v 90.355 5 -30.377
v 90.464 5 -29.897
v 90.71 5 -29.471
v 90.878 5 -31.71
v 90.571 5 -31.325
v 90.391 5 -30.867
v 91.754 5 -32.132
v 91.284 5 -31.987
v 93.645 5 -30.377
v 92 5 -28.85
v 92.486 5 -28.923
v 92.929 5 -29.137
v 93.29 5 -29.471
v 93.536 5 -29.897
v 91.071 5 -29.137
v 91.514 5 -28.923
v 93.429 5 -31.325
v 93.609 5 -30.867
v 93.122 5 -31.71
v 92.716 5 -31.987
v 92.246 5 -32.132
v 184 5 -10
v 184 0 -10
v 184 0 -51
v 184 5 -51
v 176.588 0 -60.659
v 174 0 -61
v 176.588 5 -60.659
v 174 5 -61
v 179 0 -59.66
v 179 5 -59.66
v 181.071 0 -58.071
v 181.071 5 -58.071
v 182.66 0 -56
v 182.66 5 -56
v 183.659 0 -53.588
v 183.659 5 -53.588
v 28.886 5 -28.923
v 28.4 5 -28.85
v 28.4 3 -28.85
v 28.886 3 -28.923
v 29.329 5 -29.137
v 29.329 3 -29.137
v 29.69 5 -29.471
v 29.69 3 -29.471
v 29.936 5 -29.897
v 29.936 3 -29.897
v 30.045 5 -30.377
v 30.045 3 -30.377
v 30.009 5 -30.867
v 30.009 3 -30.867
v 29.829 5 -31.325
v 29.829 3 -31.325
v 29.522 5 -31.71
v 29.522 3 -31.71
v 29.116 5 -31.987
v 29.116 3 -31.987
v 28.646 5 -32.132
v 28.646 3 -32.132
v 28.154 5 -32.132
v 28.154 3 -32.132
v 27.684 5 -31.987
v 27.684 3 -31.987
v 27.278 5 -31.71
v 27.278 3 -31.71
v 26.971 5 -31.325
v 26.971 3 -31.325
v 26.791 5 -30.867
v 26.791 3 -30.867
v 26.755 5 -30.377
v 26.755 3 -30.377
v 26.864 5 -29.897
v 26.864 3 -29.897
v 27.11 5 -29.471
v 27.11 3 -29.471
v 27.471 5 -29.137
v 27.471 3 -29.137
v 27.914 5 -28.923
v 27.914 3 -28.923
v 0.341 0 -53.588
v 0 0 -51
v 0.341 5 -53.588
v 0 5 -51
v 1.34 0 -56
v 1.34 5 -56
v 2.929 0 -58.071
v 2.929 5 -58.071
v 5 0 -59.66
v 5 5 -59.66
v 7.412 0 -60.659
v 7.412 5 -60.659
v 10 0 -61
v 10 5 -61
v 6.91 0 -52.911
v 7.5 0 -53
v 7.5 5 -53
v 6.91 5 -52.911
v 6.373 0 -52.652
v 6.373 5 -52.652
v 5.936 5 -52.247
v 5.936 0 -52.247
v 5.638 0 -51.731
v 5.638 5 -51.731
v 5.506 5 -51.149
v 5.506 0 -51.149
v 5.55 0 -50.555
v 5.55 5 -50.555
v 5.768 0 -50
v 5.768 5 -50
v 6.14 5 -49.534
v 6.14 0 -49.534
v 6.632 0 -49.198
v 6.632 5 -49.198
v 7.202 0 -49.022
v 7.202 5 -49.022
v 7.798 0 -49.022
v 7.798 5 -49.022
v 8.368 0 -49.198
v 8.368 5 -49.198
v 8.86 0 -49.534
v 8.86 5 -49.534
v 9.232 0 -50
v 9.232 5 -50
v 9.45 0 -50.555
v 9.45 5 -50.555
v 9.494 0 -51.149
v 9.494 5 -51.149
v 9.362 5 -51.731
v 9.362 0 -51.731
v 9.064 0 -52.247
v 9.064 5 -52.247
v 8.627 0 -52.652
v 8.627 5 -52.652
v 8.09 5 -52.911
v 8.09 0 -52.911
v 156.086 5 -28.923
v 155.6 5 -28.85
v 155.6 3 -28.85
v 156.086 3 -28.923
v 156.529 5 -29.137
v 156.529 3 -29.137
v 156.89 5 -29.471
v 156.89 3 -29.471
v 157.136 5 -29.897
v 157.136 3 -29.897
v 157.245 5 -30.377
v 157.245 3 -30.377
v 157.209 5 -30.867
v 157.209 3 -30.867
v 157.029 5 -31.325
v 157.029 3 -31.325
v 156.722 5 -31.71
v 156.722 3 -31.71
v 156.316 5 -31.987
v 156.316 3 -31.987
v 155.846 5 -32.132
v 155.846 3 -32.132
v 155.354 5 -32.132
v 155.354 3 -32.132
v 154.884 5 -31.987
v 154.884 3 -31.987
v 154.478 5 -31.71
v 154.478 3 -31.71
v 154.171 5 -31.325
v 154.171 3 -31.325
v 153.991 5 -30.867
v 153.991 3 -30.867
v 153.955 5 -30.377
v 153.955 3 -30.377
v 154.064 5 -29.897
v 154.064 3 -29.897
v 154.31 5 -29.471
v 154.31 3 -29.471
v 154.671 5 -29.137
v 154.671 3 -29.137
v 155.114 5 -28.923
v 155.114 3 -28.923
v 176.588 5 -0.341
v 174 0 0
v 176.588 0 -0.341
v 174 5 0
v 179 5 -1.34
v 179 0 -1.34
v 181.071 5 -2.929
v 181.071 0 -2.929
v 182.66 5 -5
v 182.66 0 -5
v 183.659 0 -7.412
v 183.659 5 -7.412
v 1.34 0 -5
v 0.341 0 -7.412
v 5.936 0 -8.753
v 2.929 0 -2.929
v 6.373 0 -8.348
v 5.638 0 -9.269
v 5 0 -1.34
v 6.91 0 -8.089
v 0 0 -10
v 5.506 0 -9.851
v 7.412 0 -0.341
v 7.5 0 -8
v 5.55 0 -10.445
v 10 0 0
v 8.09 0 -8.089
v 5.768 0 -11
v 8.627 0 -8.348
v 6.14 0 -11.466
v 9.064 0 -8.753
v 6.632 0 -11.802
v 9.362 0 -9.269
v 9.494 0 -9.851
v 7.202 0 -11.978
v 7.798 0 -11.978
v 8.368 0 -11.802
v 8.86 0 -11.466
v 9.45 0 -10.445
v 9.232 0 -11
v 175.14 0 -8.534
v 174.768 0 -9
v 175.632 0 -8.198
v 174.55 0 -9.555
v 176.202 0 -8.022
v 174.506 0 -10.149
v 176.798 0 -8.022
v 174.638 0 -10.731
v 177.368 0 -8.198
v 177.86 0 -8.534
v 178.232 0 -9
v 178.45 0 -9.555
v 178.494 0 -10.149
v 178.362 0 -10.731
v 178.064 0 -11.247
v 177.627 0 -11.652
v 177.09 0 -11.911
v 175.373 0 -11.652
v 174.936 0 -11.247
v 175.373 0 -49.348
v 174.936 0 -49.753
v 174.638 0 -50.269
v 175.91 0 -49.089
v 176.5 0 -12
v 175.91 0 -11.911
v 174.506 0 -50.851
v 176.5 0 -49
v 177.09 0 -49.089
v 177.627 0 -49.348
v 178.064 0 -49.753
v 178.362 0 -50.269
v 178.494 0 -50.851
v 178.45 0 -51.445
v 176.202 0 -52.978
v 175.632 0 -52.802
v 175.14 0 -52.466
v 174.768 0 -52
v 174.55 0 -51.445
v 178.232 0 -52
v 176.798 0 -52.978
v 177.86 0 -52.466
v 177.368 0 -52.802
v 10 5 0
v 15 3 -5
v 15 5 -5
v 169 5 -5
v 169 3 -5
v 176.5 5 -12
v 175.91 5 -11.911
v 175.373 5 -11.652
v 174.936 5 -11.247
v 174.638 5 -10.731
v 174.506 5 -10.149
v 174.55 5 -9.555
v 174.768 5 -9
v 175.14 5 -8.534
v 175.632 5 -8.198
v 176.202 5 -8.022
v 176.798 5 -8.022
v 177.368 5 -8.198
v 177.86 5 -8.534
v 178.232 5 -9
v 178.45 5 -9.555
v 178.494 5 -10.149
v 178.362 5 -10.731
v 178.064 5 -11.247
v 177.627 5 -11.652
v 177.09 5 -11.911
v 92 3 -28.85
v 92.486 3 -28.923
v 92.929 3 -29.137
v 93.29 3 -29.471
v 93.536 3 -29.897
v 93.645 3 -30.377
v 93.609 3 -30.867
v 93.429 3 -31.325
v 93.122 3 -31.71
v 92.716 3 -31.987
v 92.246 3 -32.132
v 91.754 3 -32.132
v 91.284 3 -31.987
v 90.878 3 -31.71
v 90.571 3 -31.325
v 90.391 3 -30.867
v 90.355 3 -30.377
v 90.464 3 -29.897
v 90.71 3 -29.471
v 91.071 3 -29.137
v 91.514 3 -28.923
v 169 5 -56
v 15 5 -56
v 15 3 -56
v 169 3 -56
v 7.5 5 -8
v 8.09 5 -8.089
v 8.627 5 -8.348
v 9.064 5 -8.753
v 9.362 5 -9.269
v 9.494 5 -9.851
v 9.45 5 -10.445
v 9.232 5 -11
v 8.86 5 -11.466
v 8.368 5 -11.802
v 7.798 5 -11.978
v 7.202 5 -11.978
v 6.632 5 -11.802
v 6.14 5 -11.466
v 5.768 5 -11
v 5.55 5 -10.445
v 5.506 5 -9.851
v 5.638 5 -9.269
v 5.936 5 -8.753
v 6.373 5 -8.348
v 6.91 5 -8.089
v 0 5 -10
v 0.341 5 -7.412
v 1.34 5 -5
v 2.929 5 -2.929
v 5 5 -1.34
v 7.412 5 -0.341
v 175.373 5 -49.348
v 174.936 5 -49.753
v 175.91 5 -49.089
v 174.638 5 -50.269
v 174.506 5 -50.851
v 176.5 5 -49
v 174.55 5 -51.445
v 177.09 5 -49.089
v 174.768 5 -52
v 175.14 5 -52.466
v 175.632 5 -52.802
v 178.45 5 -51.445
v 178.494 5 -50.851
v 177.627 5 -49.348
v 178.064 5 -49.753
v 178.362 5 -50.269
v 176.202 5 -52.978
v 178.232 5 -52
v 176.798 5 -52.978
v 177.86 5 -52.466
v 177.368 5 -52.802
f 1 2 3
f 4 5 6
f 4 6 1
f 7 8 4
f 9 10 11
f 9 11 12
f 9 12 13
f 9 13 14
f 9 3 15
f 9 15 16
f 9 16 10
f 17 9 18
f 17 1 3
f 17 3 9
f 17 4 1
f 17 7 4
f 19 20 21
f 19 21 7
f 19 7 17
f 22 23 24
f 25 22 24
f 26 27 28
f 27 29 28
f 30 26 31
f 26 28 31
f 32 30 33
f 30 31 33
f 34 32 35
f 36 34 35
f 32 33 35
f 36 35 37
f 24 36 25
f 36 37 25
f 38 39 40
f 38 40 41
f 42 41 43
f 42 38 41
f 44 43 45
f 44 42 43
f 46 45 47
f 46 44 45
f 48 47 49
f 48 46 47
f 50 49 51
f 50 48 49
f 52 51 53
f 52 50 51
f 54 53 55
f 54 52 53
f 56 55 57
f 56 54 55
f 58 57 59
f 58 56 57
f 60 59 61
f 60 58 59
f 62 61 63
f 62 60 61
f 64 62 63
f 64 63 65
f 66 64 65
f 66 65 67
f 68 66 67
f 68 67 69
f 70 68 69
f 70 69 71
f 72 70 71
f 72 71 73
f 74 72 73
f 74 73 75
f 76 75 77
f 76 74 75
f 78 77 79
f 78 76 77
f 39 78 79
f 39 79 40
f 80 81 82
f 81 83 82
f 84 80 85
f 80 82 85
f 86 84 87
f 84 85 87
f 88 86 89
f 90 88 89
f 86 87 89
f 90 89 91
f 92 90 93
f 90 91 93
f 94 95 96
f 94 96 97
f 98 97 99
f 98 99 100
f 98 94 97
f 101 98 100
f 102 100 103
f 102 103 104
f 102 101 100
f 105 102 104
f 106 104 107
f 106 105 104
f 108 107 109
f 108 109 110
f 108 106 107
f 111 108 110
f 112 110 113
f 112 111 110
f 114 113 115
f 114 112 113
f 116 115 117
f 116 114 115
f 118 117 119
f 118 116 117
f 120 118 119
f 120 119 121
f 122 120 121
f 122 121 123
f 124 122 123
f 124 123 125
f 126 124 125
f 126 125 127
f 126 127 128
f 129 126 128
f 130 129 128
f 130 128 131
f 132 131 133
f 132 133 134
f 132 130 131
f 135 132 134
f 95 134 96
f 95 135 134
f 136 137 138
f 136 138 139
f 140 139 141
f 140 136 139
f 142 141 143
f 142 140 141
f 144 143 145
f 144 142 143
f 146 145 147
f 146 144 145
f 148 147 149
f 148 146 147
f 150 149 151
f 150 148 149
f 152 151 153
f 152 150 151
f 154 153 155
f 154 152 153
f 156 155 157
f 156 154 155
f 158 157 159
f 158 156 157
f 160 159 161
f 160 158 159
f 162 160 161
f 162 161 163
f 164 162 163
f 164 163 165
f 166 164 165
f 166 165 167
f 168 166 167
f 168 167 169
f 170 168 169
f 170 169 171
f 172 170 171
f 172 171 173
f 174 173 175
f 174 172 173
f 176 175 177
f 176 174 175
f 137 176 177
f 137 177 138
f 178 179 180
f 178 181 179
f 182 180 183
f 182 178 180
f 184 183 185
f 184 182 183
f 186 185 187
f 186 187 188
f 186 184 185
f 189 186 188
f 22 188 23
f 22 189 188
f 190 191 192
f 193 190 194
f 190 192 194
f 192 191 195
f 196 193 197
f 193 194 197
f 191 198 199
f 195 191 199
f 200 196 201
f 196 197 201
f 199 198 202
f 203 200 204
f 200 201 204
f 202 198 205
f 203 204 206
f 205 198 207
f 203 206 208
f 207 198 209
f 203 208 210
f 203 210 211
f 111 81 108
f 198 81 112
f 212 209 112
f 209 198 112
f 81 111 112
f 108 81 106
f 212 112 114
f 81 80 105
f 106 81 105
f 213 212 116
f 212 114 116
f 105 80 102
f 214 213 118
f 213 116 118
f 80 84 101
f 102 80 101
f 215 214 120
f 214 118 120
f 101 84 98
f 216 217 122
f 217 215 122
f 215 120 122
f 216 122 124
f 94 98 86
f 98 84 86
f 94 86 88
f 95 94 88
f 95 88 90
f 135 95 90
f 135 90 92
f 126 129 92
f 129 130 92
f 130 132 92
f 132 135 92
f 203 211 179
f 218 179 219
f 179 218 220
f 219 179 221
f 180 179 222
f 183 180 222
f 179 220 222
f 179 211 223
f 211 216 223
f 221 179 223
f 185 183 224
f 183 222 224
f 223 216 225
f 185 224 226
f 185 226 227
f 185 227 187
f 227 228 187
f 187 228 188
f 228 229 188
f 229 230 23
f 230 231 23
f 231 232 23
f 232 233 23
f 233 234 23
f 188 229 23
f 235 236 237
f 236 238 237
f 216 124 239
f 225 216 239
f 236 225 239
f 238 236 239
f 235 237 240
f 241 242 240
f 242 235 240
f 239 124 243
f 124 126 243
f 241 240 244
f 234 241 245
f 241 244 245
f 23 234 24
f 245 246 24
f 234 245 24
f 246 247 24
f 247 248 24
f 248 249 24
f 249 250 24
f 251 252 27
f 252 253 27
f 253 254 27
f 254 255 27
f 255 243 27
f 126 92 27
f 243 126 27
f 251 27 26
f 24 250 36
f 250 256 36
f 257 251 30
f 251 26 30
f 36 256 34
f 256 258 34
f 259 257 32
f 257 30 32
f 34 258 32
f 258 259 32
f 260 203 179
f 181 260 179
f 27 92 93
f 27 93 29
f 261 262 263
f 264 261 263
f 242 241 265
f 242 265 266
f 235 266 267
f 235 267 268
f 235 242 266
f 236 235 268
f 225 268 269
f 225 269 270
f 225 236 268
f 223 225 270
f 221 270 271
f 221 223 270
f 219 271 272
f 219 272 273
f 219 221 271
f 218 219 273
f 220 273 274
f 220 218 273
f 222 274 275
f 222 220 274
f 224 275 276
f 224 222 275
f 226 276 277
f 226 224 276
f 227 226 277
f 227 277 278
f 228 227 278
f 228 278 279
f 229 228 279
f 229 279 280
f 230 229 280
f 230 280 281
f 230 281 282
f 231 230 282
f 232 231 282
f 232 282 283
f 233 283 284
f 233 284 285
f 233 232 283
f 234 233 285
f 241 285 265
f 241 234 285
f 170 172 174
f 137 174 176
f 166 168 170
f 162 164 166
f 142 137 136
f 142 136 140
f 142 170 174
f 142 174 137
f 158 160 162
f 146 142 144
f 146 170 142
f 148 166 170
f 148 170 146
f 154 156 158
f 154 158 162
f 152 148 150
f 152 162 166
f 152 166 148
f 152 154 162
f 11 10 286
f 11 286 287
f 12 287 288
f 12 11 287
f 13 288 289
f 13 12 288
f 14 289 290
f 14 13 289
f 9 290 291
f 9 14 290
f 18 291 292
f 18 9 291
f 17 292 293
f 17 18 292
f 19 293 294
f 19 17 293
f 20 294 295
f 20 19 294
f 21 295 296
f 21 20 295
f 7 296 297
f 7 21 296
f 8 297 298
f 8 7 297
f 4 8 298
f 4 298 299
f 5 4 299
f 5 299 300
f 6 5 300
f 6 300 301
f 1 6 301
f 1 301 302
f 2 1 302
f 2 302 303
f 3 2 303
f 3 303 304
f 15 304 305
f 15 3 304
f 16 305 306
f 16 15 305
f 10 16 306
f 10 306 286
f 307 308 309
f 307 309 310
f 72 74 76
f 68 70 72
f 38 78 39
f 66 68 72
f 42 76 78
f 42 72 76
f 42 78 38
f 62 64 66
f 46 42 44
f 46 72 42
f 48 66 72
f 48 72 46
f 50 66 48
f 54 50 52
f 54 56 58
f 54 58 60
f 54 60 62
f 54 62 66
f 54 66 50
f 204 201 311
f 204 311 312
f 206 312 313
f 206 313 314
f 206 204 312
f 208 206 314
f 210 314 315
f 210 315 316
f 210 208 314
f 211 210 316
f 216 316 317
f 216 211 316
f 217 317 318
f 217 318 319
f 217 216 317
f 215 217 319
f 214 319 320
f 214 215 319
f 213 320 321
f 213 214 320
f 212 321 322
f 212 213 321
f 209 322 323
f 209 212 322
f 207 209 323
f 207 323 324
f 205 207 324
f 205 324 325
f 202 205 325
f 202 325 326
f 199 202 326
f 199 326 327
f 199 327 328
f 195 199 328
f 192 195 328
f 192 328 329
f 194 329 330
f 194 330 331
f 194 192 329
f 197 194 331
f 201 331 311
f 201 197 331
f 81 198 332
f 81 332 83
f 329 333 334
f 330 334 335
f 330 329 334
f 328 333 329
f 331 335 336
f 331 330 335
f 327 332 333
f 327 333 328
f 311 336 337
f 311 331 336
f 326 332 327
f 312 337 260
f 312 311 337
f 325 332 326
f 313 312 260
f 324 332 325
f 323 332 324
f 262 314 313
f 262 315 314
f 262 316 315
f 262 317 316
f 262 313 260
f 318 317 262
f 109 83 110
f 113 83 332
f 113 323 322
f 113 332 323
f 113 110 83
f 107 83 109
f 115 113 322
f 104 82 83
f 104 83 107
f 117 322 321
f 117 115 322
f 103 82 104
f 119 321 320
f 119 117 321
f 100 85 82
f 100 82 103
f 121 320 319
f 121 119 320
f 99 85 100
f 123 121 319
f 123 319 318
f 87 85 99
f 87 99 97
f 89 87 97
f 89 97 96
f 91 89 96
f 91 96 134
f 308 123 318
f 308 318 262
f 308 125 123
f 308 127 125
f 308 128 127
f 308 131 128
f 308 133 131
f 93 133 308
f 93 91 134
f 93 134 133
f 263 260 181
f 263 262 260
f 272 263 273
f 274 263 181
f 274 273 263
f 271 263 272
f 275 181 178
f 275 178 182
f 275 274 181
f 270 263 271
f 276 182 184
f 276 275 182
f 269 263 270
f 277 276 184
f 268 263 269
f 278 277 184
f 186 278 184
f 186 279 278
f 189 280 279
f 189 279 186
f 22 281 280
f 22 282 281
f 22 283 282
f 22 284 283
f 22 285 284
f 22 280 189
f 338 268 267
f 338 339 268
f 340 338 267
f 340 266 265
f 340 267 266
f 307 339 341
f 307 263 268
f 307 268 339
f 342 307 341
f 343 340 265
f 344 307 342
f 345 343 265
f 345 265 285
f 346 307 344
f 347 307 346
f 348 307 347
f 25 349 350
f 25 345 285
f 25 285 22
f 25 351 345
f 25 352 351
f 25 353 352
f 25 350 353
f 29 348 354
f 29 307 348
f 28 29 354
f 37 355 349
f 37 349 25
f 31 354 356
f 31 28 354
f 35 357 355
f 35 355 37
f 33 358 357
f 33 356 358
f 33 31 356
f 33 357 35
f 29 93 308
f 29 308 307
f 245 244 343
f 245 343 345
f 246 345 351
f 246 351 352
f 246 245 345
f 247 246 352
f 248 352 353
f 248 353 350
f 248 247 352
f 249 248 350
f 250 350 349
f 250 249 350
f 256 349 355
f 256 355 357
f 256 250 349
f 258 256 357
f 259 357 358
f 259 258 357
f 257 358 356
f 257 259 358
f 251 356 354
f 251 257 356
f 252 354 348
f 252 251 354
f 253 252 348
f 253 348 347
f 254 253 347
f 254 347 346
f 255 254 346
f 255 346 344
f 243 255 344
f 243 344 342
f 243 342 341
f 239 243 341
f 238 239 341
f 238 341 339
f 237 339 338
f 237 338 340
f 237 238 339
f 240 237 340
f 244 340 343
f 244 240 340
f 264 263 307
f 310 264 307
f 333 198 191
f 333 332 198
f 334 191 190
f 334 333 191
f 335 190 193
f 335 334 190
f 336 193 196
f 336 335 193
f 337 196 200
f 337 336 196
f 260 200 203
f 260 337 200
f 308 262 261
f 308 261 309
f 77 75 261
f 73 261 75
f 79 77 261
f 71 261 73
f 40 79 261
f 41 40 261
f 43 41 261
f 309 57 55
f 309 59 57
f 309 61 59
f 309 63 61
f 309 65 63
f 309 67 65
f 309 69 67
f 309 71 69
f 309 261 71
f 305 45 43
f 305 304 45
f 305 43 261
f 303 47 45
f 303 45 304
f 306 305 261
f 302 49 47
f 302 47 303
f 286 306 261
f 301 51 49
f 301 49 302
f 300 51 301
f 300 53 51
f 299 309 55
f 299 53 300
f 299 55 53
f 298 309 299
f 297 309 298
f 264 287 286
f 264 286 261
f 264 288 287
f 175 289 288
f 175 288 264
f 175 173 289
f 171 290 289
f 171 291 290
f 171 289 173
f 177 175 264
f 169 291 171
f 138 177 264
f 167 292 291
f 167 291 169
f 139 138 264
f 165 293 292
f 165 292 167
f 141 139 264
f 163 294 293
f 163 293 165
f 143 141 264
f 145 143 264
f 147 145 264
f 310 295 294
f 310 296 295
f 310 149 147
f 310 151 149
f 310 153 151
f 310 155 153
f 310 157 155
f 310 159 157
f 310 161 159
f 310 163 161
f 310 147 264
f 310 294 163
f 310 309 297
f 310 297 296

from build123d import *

# Parameters (mm, degrees)
SKETCH2_W           = 184
SKETCH2_H           = 61
SKETCH2_R           = 2
BOSS_EXTRUDE1_DEPTH = 5
SKETCH3_W           = 154
SKETCH3_H           = 51
SKETCH3_R           = 1.65
CUT_EXTRUDE1_DEPTH  = 2
FILLET1_R           = 10


with BuildPart() as part:
    # Sketch2 → Boss-Extrude1 (new body)
    with BuildSketch(Plane(origin=(0, 0, 0), x_dir=(1, 0, 0), z_dir=(0, 1, 0))):
        with Locations((92, 30.5)):
            Rectangle(SKETCH2_W, SKETCH2_H)
        with Locations(Location((7.5, 10, 0), (0, 0, 270))):
            Circle(SKETCH2_R, mode=Mode.SUBTRACT)
        with Locations(Location((176.5, 10, 0), (0, 0, 90))):
            Circle(SKETCH2_R, mode=Mode.SUBTRACT)
        with Locations(Location((176.5, 51, 0), (0, 0, 270))):
            Circle(SKETCH2_R, mode=Mode.SUBTRACT)
        with Locations(Location((7.5, 51, 0), (0, 0, 90))):
            Circle(SKETCH2_R, mode=Mode.SUBTRACT)
    extrude(amount=BOSS_EXTRUDE1_DEPTH)

    # Sketch3 → Cut-Extrude1 (cut)
    with BuildSketch(Plane(origin=(0, 5, 0), x_dir=(1, 0, 0), z_dir=(0, 1, 0))):
        with Locations((92, 30.5)):
            Rectangle(SKETCH3_W, SKETCH3_H)
        with Locations(Location((92, 30.5, 0), (0, 0, 270))):
            Circle(SKETCH3_R, mode=Mode.SUBTRACT)
        with Locations(Location((28.4, 30.5, 0), (0, 0, 270))):
            Circle(SKETCH3_R, mode=Mode.SUBTRACT)
        with Locations(Location((155.6, 30.5, 0), (0, 0, 270))):
            Circle(SKETCH3_R, mode=Mode.SUBTRACT)
    extrude(amount=-CUT_EXTRUDE1_DEPTH, mode=Mode.SUBTRACT)

    # Fillet1
    fillet1_edges = [part.edges().sort_by_distance(p)[0] for p in [
        (0, 2.5, -61),
        (184, 2.5, -61),
        (184, 2.5, 0),
        (0, 2.5, 0),
    ]]
    fillet(fillet1_edges, radius=FILLET1_R)


solid = part.part
